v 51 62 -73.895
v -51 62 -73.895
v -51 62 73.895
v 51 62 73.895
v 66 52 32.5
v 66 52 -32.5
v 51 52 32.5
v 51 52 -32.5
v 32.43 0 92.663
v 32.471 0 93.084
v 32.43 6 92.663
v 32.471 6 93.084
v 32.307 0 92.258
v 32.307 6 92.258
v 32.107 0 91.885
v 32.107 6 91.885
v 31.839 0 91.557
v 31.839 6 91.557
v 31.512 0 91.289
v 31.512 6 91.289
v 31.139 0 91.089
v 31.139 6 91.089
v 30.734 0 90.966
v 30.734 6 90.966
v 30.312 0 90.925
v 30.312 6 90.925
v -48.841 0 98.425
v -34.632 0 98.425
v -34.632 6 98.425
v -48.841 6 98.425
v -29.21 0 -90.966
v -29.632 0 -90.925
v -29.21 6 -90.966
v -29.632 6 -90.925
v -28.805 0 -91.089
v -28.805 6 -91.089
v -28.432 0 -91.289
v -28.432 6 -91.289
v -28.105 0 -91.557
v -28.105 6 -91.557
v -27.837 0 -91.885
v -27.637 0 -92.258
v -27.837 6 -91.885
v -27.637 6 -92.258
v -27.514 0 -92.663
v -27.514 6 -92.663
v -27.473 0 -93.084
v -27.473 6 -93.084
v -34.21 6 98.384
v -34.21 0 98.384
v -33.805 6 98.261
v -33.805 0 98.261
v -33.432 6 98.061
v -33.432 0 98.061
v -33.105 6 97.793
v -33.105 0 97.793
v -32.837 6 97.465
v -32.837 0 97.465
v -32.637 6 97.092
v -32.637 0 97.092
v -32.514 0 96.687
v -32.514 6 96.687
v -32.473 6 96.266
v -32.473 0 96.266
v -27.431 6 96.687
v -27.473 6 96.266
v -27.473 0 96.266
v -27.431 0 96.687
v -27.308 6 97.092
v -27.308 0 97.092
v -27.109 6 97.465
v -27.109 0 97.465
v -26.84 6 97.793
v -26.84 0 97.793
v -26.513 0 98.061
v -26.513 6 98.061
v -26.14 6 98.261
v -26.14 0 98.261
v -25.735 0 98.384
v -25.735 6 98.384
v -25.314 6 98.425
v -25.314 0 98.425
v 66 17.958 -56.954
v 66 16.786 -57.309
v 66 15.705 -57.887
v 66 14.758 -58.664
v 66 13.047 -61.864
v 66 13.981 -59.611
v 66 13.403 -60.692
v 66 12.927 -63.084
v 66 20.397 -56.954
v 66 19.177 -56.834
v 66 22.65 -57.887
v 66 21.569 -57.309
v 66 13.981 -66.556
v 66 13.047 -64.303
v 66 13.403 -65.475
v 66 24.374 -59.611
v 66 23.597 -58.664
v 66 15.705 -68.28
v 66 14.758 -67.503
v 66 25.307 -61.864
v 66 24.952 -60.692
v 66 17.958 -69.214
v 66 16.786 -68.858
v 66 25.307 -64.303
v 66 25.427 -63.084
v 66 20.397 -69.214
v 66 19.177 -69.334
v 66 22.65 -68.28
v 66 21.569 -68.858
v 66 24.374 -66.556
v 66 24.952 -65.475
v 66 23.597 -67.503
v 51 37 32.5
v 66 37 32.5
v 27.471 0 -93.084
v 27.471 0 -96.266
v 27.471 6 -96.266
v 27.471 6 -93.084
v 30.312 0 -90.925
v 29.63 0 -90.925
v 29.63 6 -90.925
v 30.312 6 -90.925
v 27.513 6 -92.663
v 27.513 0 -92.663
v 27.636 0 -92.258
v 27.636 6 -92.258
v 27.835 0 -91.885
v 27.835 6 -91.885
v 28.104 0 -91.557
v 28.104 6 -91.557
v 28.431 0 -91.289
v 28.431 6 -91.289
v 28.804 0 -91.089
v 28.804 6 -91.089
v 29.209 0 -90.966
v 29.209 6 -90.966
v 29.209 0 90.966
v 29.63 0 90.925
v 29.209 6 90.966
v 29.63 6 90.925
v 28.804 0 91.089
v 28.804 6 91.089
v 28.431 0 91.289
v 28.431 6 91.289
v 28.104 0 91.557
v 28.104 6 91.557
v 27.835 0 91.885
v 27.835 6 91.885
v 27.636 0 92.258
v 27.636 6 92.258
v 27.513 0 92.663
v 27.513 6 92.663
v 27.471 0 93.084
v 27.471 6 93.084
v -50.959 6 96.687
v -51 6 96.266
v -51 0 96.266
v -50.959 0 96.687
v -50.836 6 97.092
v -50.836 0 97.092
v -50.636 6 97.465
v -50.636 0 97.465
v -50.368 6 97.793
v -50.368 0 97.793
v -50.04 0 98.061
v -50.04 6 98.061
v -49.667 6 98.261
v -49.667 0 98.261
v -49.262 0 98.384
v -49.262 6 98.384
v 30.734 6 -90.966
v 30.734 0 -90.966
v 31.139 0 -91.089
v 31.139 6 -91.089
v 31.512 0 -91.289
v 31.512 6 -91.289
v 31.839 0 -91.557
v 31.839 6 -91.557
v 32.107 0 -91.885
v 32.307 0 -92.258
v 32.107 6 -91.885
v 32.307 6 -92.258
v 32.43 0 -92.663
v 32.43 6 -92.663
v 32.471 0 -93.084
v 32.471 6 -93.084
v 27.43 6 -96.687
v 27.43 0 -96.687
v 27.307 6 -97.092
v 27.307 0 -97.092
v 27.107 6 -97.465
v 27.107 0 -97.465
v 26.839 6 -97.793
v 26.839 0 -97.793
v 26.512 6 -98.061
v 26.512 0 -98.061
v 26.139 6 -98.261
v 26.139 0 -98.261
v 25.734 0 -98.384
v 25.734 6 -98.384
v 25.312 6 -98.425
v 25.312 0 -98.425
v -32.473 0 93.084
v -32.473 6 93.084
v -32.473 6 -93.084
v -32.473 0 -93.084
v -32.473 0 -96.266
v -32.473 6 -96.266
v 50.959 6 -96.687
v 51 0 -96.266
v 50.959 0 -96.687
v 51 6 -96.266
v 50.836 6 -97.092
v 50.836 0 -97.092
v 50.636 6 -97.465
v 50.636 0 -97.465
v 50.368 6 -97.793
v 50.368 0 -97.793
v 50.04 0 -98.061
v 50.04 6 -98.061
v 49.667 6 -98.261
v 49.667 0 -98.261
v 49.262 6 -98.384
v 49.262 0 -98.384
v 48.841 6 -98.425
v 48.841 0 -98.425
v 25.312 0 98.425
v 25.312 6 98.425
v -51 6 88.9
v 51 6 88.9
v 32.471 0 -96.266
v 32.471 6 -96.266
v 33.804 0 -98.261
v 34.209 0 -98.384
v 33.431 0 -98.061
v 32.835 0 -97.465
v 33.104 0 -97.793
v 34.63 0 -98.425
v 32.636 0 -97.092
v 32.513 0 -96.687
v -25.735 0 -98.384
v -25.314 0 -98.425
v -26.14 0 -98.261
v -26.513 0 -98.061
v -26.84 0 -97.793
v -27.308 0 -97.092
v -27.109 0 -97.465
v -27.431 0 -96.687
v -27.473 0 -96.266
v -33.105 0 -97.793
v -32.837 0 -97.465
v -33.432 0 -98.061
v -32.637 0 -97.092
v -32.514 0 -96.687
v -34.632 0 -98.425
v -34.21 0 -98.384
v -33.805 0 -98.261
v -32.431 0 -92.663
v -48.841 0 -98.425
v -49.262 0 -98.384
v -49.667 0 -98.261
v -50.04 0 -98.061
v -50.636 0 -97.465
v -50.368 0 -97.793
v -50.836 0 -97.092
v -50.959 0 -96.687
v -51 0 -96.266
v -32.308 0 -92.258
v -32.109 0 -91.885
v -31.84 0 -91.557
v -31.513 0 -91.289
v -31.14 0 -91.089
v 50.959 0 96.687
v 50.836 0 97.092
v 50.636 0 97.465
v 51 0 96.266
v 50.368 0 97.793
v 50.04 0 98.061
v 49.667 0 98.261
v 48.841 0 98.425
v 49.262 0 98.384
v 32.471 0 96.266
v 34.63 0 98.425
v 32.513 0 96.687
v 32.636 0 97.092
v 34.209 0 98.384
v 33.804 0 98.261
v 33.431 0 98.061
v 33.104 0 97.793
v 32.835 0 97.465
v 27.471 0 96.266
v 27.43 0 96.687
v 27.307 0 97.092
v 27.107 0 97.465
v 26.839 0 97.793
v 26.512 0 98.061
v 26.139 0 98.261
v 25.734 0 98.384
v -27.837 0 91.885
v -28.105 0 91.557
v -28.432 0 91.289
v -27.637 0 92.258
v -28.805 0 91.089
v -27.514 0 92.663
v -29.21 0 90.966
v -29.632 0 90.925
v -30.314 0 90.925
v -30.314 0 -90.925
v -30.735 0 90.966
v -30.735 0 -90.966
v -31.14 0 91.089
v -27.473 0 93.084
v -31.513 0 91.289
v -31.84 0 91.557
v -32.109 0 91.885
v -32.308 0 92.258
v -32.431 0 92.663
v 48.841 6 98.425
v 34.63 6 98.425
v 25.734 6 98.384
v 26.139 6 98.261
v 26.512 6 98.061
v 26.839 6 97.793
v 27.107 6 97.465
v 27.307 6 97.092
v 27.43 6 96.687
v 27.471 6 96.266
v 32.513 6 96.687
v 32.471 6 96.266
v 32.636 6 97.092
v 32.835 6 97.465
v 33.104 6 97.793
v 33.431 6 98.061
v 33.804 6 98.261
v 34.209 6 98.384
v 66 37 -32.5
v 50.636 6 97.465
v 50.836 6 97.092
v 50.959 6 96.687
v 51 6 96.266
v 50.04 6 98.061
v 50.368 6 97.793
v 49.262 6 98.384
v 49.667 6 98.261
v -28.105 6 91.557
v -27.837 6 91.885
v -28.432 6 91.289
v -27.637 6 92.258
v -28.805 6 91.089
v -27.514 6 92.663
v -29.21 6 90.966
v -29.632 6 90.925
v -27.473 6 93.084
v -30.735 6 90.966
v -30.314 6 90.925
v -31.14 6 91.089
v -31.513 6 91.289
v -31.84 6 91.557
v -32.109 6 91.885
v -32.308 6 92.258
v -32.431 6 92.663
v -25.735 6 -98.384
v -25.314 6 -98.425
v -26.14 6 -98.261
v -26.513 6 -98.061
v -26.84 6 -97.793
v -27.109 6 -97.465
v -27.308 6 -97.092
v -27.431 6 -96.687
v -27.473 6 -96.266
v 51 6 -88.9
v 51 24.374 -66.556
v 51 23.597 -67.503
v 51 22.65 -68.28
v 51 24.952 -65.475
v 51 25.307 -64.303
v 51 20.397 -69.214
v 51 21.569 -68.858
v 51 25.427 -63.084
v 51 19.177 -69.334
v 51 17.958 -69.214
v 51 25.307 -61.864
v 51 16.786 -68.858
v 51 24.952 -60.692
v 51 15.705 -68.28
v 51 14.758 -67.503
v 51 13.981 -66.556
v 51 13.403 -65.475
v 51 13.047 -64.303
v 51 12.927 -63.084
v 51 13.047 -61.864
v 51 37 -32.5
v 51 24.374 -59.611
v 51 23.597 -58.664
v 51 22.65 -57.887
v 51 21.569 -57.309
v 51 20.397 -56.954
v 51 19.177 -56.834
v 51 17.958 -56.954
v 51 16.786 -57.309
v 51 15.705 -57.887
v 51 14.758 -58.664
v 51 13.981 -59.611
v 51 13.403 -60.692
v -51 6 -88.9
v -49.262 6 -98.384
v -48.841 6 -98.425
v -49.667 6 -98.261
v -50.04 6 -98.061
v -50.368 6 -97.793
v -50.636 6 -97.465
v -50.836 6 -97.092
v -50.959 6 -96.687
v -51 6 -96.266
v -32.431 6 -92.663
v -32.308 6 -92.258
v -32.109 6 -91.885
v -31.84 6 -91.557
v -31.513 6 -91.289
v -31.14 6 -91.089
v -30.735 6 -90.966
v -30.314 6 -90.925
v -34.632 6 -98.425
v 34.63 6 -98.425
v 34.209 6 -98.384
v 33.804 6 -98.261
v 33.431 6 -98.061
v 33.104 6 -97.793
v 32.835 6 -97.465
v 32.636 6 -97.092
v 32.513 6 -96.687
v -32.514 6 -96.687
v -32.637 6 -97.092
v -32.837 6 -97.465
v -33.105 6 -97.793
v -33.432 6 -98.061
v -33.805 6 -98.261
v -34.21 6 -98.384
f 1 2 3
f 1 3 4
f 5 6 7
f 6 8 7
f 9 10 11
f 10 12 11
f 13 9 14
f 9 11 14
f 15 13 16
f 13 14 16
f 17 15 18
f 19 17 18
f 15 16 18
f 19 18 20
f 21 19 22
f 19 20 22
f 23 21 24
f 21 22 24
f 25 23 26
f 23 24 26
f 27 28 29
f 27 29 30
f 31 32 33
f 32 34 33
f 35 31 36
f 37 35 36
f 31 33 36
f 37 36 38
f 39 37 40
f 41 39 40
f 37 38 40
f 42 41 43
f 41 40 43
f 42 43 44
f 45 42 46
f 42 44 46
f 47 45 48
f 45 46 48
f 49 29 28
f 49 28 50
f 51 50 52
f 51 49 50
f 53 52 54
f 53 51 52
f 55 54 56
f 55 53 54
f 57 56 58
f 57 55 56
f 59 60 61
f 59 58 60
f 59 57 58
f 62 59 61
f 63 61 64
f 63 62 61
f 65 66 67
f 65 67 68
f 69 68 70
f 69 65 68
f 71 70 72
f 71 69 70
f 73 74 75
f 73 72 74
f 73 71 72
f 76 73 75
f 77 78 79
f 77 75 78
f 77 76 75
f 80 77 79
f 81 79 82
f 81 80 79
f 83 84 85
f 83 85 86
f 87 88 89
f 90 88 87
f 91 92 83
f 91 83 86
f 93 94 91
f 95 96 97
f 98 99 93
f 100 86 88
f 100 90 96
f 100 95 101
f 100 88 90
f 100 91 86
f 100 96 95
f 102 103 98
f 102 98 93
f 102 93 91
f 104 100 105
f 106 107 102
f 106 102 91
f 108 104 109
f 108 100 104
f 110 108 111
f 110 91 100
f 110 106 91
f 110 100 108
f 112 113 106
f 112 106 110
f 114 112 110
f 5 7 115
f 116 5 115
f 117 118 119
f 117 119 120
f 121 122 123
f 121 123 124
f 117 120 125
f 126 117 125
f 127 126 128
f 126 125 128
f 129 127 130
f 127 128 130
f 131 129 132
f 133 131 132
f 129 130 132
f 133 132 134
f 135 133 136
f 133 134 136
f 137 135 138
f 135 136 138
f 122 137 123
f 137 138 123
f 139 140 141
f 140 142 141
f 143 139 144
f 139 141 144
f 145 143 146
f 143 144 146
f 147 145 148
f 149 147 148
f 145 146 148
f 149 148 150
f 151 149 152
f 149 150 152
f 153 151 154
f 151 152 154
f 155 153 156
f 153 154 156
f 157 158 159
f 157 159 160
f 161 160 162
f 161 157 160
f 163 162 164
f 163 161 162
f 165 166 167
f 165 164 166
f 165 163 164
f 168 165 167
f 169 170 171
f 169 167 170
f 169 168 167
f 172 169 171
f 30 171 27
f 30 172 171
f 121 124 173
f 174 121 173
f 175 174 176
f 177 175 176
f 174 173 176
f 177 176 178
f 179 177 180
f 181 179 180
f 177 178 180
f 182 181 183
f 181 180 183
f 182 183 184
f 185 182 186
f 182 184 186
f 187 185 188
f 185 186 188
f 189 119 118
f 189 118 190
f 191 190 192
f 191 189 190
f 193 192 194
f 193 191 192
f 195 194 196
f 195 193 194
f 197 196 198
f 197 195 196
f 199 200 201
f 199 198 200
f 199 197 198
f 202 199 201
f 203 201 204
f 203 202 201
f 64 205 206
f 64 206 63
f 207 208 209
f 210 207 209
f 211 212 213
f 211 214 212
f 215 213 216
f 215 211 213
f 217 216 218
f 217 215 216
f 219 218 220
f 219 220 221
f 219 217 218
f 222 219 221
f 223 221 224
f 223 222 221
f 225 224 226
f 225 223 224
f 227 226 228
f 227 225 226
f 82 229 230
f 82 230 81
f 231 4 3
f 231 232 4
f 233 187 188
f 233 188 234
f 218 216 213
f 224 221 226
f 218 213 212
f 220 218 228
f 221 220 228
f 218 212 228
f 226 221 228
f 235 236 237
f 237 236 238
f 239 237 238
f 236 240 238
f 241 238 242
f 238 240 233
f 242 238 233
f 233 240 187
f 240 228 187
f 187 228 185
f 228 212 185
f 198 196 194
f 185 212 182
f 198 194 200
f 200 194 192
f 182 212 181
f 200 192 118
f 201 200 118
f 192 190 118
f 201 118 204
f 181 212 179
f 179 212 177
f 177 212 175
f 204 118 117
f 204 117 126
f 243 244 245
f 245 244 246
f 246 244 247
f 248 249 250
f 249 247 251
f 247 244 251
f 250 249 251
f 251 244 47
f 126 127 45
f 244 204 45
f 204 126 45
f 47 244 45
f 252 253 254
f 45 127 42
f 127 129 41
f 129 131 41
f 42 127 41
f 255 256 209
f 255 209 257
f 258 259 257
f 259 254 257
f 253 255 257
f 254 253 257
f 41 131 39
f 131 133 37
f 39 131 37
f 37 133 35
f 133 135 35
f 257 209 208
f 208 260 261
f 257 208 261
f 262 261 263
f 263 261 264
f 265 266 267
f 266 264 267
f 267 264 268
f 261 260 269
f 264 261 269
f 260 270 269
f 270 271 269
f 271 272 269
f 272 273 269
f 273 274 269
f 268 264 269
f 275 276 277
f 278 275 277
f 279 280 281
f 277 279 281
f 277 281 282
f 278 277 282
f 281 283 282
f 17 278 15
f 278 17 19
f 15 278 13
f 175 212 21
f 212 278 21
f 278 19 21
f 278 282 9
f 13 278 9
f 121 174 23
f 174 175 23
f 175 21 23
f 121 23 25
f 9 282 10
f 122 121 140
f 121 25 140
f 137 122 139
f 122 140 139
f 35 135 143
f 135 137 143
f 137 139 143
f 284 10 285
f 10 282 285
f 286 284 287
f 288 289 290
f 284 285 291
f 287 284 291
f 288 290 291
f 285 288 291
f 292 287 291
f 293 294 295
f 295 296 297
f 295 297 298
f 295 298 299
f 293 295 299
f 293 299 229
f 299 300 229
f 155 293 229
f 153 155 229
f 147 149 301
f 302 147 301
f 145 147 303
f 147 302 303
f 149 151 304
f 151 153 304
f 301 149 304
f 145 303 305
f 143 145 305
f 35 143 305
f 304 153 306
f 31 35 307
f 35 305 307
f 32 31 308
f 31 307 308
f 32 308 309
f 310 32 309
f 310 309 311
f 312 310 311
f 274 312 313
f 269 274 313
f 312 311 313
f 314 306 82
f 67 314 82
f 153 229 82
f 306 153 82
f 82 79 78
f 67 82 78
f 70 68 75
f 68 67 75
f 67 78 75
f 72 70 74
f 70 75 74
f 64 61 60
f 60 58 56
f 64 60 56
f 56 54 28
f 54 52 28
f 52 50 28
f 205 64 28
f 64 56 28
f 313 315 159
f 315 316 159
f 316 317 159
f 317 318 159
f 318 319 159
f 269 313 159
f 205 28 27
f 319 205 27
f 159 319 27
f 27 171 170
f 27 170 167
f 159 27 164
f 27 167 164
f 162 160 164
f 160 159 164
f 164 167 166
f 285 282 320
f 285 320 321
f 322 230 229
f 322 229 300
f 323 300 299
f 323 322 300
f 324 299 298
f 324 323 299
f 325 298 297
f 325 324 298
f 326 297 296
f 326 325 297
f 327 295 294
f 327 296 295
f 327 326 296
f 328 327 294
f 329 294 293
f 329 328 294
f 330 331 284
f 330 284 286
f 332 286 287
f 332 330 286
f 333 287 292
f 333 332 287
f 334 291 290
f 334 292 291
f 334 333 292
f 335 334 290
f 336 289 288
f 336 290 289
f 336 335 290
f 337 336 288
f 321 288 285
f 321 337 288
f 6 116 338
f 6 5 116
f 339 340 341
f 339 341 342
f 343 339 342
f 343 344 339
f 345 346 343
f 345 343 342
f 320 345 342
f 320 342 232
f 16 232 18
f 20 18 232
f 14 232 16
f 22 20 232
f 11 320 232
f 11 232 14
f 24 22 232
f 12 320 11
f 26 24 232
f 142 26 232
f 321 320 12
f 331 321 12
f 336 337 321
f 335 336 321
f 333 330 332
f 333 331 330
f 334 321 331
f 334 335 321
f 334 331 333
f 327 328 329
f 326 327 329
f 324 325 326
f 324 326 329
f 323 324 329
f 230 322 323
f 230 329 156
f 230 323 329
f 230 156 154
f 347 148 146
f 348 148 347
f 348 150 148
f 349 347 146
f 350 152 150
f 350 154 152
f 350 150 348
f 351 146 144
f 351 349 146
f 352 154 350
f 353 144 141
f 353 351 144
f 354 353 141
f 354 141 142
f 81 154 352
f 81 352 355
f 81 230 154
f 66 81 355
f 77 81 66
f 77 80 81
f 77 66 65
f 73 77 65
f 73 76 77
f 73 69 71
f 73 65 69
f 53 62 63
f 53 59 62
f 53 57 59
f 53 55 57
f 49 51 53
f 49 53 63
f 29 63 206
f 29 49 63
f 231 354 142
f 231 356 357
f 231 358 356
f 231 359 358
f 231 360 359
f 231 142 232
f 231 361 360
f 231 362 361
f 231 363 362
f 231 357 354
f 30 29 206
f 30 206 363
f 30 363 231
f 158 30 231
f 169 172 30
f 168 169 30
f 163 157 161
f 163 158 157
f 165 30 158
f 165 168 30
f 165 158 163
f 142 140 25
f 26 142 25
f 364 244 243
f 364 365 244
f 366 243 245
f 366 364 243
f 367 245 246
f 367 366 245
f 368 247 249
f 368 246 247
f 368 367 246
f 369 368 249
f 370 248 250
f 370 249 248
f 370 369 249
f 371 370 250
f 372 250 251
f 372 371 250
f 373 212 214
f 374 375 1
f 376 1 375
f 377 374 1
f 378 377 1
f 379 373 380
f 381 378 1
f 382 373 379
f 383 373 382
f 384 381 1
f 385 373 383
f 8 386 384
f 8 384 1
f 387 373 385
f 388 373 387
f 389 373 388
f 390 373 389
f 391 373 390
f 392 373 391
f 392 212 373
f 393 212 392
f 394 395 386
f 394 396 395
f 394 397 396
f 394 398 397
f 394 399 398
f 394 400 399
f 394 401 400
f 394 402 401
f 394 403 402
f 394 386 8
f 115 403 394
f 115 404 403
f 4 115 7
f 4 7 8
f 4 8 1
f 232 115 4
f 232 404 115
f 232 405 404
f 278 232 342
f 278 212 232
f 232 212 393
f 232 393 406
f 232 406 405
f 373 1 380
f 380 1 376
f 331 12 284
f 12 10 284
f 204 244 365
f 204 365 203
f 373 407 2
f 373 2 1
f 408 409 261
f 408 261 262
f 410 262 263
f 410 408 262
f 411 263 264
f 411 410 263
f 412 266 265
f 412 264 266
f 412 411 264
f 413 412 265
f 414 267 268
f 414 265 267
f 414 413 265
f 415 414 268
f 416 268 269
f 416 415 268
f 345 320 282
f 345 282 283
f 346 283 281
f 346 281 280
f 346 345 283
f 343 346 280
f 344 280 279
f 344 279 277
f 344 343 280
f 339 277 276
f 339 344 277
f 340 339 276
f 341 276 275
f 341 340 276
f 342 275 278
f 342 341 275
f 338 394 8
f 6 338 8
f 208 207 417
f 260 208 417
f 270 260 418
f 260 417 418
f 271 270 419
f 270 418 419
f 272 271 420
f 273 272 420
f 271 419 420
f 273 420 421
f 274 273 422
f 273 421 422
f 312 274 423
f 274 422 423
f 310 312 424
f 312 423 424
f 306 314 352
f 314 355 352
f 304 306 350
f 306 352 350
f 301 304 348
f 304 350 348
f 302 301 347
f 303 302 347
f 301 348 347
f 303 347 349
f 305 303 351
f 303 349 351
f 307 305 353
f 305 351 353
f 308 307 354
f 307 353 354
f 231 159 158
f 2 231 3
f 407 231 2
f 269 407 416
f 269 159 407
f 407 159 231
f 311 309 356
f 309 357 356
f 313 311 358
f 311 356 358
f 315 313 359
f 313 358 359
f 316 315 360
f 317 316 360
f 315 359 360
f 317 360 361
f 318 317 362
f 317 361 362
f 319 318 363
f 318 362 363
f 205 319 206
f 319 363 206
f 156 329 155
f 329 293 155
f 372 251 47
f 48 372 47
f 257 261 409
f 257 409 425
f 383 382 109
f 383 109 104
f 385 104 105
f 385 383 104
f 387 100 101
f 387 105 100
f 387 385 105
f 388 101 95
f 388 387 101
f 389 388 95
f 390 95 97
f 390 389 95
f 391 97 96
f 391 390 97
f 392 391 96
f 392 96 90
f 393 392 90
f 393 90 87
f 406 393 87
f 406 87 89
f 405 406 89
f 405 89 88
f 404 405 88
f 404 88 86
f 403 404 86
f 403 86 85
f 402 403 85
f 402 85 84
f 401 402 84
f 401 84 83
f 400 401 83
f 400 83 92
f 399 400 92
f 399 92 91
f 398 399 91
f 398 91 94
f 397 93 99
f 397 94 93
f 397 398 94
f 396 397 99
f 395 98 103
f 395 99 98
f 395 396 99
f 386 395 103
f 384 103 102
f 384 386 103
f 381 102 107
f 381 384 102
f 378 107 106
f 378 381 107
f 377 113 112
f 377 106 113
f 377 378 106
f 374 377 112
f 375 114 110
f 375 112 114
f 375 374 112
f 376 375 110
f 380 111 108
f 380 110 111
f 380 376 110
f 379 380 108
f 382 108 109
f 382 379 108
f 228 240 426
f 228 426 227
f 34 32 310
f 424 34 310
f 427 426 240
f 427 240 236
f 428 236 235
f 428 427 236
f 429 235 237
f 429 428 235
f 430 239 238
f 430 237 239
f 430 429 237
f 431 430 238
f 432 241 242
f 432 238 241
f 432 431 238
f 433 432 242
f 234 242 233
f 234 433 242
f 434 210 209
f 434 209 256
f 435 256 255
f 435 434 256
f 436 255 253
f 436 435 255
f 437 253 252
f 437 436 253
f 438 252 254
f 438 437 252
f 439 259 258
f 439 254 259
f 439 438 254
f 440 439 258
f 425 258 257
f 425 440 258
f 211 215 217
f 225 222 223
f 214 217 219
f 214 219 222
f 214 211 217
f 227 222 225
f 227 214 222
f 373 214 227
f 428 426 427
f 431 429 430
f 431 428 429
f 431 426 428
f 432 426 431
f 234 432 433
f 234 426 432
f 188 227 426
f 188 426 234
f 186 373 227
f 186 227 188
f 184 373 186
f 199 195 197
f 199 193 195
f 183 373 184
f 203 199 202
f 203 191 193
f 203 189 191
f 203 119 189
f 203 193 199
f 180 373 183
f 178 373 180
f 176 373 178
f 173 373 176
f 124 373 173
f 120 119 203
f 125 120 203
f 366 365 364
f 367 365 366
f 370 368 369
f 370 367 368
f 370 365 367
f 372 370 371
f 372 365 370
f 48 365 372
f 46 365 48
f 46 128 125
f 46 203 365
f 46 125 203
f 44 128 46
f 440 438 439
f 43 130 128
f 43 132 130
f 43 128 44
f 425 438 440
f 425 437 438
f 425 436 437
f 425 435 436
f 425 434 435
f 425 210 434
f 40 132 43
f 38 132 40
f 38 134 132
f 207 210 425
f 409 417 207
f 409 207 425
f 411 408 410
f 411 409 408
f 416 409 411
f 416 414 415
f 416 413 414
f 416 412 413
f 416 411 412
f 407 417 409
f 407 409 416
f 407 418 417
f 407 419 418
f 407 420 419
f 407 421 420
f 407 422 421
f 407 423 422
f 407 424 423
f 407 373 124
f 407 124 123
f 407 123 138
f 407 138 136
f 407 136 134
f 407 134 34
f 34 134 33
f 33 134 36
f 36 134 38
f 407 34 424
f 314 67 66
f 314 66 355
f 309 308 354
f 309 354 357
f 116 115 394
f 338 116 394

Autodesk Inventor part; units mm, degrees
ref_plane "YZ Plane" through (0, 0, 0) normal (1, 0, 0) x (0, 1, 0)
ref_plane "XZ Plane" through (0, 0, 0) normal (0, 1, 0) x (-1, 0, 0)
ref_plane "XY Plane" through (0, 0, 0) normal (0, 0, 1) x (1, 0, 0)
sketch "Sketch1" plane through (0, 0, 0) normal (0, 1, 0) x (-1, 0, 0)
  line L0 (-51, 98.425) -> (51, 98.425)
  line L1 (51, 98.425) -> (51, -98.425)
  line L2 (51, -98.425) -> (-51, -98.425)
  line L3 (-51, -98.425) -> (-51, 98.425)
  line L4 (-51, 98.425) -> (51, -98.425) construction
  line L5 (51, 98.425) -> (-51, -98.425) construction
  point P0 (0, 0)
  dimension "d0" = 102
  dimension "d1" = 196.85
extrude "Extrusion1" add sketch "Sketch1" along normal blind 6
sketch "Sketch2" plane through (0, 6, 0) normal (0, 1, 0) x (1, 0, 0)
  line L0 (51, -88.9) -> (-51, -88.9)
  line L1 (-51, -88.9) -> (-51, 88.9)
  line L2 (-51, 88.9) -> (51, 88.9)
  line L3 (51, 88.9) -> (51, -88.9)
  line L4 (51, -88.9) -> (-51, 88.9) construction
  line L5 (-51, -88.9) -> (51, 88.9) construction
  point P0 (0, 0)
  dimension "d4" = 102
  dimension "d5" = 177.8
extrude "Extrusion2" add sketch "Sketch2" along normal blind 56
draft "FaceDraft1" angle 15 pull direction (0, 1, 0) faces at (17, 24.6667, 88.9) fixed edges at (0, 6, 88.9)
draft "FaceDraft2" angle 15 pull direction (0, 1, 0) faces at (-17, 24.6667, -88.9) fixed edges at (0, 6, -88.9)
sketch "Sketch3" plane through (0, 0, 0) normal (0, -1, 0) x (1, 0, 0)
  line L0 (32.4713, 98.425) -> (27.4713, 98.425)
  line L1 (27.4713, 98.425) -> (27.4713, 90.925)
  line L2 (27.4713, 90.925) -> (32.4713, 90.925)
  line L3 (32.4713, 90.925) -> (32.4713, 98.425)
  line L4 (32.4713, 98.425) -> (27.4713, 90.925) construction
  line L5 (27.4713, 98.425) -> (32.4713, 90.925) construction
  line L6 (51, -98.425) -> (51, 98.425) projected
  line L7 (-51, 98.425) -> (51, 98.425) projected
  line L8 (-27.4727, 90.925) -> (-32.4727, 90.925)
  line L9 (-32.4727, 90.925) -> (-32.4727, 98.425)
  line L10 (-32.4727, 98.425) -> (-27.4727, 98.425)
  line L11 (-27.4727, 98.425) -> (-27.4727, 90.925)
  line L12 (-27.4727, 90.925) -> (-32.4727, 98.425) construction
  line L13 (-32.4727, 90.925) -> (-27.4727, 98.425) construction
  line L14 (-51, 98.425) -> (-51, -98.425) projected
  line L15 (51, 0) -> (-51, 0)
  line L16 (-51, -73.8948) -> (-51, 73.8948) projected
  line L17 (32.4713, -98.425) -> (27.4713, -98.425)
  line L18 (27.4713, -98.425) -> (27.4713, -90.925)
  line L19 (27.4713, -90.925) -> (32.4713, -90.925)
  line L20 (32.4713, -90.925) -> (32.4713, -98.425)
  line L21 (-27.4727, -90.925) -> (-32.4727, -90.925)
  line L22 (-32.4727, -90.925) -> (-32.4727, -98.425)
  line L23 (-32.4727, -98.425) -> (-27.4727, -98.425)
  line L24 (-27.4727, -98.425) -> (-27.4727, -90.925)
  point P0 (0, 0)
  point P1 (29.9713, 94.675)
  point P2 (-29.9727, 94.675)
  point P3 (29.9713, -94.675)
  dimension "d10" = 5
  dimension "d11" = 7.5
  dimension "d12" = 21.0287
  dimension "d13" = 7.5
  dimension "d14" = 5
  dimension "d16" = 59.944
  dimension "d17" = 0
extrude "Extrusion3" cut sketch "Sketch3" against normal blind 56 contours L3 L2 L1 L0 | L11 L8 L9 L7 | L17 L18 L19 L20 | L24 L23 L22 L21
fillet "Fillet1" radius 2.159 20 edges at (27.4713, 3, 90.925) (32.4713, 3, 90.925) (32.4713, 3, 98.425) (27.4713, 3, 98.425) (-27.4727, 3, 90.925) (-32.4727, 3, 90.925) (-32.4727, 3, 98.425) (-27.4727, 3, 98.425) (-27.4727, 3, -98.425) (-27.4727, 3, -90.925) (-32.4727, 3, -90.925) (-32.4727, 3, -98.425) (27.4713, 3, -90.925) (27.4713, 3, -98.425) (32.4713, 3, -90.925) (32.4713, 3, -98.425) (51, 3, -98.425) (-51, 3, -98.425) (-51, 3, 98.425) (51, 3, 98.425)
sketch "Sketch4" plane through (51, 62, 73.8948) normal (1, 0, 0) x (0, 0, -1)
  line L0 (41.3948, -25) -> (106.3948, -25)
  line L1 (106.3948, -25) -> (106.3948, -10)
  line L2 (106.3948, -10) -> (41.3948, -10)
  line L3 (41.3948, -10) -> (41.3948, -25)
  line L4 (41.3948, -25) -> (106.3948, -10) construction
  line L5 (106.3948, -25) -> (41.3948, -10) construction
  line L6 (0, 0) -> (147.7897, 0) projected
  circle A0 centre (136.9784, -42.8226) radius 6.25
  point P0 (73.8948, -62)
  point P1 (73.8948, -17.5)
  dimension "d21" = 65
  dimension "d22" = 15
  dimension "d23" = 17.5
  dimension "d24" = 12.5
extrude "Extrusion4" add sketch "Sketch4" along normal blind 15
equation "\"d13\" = d11"
equation "\"d14\" = d10"
properties part number "12v_dc_to_dc"
